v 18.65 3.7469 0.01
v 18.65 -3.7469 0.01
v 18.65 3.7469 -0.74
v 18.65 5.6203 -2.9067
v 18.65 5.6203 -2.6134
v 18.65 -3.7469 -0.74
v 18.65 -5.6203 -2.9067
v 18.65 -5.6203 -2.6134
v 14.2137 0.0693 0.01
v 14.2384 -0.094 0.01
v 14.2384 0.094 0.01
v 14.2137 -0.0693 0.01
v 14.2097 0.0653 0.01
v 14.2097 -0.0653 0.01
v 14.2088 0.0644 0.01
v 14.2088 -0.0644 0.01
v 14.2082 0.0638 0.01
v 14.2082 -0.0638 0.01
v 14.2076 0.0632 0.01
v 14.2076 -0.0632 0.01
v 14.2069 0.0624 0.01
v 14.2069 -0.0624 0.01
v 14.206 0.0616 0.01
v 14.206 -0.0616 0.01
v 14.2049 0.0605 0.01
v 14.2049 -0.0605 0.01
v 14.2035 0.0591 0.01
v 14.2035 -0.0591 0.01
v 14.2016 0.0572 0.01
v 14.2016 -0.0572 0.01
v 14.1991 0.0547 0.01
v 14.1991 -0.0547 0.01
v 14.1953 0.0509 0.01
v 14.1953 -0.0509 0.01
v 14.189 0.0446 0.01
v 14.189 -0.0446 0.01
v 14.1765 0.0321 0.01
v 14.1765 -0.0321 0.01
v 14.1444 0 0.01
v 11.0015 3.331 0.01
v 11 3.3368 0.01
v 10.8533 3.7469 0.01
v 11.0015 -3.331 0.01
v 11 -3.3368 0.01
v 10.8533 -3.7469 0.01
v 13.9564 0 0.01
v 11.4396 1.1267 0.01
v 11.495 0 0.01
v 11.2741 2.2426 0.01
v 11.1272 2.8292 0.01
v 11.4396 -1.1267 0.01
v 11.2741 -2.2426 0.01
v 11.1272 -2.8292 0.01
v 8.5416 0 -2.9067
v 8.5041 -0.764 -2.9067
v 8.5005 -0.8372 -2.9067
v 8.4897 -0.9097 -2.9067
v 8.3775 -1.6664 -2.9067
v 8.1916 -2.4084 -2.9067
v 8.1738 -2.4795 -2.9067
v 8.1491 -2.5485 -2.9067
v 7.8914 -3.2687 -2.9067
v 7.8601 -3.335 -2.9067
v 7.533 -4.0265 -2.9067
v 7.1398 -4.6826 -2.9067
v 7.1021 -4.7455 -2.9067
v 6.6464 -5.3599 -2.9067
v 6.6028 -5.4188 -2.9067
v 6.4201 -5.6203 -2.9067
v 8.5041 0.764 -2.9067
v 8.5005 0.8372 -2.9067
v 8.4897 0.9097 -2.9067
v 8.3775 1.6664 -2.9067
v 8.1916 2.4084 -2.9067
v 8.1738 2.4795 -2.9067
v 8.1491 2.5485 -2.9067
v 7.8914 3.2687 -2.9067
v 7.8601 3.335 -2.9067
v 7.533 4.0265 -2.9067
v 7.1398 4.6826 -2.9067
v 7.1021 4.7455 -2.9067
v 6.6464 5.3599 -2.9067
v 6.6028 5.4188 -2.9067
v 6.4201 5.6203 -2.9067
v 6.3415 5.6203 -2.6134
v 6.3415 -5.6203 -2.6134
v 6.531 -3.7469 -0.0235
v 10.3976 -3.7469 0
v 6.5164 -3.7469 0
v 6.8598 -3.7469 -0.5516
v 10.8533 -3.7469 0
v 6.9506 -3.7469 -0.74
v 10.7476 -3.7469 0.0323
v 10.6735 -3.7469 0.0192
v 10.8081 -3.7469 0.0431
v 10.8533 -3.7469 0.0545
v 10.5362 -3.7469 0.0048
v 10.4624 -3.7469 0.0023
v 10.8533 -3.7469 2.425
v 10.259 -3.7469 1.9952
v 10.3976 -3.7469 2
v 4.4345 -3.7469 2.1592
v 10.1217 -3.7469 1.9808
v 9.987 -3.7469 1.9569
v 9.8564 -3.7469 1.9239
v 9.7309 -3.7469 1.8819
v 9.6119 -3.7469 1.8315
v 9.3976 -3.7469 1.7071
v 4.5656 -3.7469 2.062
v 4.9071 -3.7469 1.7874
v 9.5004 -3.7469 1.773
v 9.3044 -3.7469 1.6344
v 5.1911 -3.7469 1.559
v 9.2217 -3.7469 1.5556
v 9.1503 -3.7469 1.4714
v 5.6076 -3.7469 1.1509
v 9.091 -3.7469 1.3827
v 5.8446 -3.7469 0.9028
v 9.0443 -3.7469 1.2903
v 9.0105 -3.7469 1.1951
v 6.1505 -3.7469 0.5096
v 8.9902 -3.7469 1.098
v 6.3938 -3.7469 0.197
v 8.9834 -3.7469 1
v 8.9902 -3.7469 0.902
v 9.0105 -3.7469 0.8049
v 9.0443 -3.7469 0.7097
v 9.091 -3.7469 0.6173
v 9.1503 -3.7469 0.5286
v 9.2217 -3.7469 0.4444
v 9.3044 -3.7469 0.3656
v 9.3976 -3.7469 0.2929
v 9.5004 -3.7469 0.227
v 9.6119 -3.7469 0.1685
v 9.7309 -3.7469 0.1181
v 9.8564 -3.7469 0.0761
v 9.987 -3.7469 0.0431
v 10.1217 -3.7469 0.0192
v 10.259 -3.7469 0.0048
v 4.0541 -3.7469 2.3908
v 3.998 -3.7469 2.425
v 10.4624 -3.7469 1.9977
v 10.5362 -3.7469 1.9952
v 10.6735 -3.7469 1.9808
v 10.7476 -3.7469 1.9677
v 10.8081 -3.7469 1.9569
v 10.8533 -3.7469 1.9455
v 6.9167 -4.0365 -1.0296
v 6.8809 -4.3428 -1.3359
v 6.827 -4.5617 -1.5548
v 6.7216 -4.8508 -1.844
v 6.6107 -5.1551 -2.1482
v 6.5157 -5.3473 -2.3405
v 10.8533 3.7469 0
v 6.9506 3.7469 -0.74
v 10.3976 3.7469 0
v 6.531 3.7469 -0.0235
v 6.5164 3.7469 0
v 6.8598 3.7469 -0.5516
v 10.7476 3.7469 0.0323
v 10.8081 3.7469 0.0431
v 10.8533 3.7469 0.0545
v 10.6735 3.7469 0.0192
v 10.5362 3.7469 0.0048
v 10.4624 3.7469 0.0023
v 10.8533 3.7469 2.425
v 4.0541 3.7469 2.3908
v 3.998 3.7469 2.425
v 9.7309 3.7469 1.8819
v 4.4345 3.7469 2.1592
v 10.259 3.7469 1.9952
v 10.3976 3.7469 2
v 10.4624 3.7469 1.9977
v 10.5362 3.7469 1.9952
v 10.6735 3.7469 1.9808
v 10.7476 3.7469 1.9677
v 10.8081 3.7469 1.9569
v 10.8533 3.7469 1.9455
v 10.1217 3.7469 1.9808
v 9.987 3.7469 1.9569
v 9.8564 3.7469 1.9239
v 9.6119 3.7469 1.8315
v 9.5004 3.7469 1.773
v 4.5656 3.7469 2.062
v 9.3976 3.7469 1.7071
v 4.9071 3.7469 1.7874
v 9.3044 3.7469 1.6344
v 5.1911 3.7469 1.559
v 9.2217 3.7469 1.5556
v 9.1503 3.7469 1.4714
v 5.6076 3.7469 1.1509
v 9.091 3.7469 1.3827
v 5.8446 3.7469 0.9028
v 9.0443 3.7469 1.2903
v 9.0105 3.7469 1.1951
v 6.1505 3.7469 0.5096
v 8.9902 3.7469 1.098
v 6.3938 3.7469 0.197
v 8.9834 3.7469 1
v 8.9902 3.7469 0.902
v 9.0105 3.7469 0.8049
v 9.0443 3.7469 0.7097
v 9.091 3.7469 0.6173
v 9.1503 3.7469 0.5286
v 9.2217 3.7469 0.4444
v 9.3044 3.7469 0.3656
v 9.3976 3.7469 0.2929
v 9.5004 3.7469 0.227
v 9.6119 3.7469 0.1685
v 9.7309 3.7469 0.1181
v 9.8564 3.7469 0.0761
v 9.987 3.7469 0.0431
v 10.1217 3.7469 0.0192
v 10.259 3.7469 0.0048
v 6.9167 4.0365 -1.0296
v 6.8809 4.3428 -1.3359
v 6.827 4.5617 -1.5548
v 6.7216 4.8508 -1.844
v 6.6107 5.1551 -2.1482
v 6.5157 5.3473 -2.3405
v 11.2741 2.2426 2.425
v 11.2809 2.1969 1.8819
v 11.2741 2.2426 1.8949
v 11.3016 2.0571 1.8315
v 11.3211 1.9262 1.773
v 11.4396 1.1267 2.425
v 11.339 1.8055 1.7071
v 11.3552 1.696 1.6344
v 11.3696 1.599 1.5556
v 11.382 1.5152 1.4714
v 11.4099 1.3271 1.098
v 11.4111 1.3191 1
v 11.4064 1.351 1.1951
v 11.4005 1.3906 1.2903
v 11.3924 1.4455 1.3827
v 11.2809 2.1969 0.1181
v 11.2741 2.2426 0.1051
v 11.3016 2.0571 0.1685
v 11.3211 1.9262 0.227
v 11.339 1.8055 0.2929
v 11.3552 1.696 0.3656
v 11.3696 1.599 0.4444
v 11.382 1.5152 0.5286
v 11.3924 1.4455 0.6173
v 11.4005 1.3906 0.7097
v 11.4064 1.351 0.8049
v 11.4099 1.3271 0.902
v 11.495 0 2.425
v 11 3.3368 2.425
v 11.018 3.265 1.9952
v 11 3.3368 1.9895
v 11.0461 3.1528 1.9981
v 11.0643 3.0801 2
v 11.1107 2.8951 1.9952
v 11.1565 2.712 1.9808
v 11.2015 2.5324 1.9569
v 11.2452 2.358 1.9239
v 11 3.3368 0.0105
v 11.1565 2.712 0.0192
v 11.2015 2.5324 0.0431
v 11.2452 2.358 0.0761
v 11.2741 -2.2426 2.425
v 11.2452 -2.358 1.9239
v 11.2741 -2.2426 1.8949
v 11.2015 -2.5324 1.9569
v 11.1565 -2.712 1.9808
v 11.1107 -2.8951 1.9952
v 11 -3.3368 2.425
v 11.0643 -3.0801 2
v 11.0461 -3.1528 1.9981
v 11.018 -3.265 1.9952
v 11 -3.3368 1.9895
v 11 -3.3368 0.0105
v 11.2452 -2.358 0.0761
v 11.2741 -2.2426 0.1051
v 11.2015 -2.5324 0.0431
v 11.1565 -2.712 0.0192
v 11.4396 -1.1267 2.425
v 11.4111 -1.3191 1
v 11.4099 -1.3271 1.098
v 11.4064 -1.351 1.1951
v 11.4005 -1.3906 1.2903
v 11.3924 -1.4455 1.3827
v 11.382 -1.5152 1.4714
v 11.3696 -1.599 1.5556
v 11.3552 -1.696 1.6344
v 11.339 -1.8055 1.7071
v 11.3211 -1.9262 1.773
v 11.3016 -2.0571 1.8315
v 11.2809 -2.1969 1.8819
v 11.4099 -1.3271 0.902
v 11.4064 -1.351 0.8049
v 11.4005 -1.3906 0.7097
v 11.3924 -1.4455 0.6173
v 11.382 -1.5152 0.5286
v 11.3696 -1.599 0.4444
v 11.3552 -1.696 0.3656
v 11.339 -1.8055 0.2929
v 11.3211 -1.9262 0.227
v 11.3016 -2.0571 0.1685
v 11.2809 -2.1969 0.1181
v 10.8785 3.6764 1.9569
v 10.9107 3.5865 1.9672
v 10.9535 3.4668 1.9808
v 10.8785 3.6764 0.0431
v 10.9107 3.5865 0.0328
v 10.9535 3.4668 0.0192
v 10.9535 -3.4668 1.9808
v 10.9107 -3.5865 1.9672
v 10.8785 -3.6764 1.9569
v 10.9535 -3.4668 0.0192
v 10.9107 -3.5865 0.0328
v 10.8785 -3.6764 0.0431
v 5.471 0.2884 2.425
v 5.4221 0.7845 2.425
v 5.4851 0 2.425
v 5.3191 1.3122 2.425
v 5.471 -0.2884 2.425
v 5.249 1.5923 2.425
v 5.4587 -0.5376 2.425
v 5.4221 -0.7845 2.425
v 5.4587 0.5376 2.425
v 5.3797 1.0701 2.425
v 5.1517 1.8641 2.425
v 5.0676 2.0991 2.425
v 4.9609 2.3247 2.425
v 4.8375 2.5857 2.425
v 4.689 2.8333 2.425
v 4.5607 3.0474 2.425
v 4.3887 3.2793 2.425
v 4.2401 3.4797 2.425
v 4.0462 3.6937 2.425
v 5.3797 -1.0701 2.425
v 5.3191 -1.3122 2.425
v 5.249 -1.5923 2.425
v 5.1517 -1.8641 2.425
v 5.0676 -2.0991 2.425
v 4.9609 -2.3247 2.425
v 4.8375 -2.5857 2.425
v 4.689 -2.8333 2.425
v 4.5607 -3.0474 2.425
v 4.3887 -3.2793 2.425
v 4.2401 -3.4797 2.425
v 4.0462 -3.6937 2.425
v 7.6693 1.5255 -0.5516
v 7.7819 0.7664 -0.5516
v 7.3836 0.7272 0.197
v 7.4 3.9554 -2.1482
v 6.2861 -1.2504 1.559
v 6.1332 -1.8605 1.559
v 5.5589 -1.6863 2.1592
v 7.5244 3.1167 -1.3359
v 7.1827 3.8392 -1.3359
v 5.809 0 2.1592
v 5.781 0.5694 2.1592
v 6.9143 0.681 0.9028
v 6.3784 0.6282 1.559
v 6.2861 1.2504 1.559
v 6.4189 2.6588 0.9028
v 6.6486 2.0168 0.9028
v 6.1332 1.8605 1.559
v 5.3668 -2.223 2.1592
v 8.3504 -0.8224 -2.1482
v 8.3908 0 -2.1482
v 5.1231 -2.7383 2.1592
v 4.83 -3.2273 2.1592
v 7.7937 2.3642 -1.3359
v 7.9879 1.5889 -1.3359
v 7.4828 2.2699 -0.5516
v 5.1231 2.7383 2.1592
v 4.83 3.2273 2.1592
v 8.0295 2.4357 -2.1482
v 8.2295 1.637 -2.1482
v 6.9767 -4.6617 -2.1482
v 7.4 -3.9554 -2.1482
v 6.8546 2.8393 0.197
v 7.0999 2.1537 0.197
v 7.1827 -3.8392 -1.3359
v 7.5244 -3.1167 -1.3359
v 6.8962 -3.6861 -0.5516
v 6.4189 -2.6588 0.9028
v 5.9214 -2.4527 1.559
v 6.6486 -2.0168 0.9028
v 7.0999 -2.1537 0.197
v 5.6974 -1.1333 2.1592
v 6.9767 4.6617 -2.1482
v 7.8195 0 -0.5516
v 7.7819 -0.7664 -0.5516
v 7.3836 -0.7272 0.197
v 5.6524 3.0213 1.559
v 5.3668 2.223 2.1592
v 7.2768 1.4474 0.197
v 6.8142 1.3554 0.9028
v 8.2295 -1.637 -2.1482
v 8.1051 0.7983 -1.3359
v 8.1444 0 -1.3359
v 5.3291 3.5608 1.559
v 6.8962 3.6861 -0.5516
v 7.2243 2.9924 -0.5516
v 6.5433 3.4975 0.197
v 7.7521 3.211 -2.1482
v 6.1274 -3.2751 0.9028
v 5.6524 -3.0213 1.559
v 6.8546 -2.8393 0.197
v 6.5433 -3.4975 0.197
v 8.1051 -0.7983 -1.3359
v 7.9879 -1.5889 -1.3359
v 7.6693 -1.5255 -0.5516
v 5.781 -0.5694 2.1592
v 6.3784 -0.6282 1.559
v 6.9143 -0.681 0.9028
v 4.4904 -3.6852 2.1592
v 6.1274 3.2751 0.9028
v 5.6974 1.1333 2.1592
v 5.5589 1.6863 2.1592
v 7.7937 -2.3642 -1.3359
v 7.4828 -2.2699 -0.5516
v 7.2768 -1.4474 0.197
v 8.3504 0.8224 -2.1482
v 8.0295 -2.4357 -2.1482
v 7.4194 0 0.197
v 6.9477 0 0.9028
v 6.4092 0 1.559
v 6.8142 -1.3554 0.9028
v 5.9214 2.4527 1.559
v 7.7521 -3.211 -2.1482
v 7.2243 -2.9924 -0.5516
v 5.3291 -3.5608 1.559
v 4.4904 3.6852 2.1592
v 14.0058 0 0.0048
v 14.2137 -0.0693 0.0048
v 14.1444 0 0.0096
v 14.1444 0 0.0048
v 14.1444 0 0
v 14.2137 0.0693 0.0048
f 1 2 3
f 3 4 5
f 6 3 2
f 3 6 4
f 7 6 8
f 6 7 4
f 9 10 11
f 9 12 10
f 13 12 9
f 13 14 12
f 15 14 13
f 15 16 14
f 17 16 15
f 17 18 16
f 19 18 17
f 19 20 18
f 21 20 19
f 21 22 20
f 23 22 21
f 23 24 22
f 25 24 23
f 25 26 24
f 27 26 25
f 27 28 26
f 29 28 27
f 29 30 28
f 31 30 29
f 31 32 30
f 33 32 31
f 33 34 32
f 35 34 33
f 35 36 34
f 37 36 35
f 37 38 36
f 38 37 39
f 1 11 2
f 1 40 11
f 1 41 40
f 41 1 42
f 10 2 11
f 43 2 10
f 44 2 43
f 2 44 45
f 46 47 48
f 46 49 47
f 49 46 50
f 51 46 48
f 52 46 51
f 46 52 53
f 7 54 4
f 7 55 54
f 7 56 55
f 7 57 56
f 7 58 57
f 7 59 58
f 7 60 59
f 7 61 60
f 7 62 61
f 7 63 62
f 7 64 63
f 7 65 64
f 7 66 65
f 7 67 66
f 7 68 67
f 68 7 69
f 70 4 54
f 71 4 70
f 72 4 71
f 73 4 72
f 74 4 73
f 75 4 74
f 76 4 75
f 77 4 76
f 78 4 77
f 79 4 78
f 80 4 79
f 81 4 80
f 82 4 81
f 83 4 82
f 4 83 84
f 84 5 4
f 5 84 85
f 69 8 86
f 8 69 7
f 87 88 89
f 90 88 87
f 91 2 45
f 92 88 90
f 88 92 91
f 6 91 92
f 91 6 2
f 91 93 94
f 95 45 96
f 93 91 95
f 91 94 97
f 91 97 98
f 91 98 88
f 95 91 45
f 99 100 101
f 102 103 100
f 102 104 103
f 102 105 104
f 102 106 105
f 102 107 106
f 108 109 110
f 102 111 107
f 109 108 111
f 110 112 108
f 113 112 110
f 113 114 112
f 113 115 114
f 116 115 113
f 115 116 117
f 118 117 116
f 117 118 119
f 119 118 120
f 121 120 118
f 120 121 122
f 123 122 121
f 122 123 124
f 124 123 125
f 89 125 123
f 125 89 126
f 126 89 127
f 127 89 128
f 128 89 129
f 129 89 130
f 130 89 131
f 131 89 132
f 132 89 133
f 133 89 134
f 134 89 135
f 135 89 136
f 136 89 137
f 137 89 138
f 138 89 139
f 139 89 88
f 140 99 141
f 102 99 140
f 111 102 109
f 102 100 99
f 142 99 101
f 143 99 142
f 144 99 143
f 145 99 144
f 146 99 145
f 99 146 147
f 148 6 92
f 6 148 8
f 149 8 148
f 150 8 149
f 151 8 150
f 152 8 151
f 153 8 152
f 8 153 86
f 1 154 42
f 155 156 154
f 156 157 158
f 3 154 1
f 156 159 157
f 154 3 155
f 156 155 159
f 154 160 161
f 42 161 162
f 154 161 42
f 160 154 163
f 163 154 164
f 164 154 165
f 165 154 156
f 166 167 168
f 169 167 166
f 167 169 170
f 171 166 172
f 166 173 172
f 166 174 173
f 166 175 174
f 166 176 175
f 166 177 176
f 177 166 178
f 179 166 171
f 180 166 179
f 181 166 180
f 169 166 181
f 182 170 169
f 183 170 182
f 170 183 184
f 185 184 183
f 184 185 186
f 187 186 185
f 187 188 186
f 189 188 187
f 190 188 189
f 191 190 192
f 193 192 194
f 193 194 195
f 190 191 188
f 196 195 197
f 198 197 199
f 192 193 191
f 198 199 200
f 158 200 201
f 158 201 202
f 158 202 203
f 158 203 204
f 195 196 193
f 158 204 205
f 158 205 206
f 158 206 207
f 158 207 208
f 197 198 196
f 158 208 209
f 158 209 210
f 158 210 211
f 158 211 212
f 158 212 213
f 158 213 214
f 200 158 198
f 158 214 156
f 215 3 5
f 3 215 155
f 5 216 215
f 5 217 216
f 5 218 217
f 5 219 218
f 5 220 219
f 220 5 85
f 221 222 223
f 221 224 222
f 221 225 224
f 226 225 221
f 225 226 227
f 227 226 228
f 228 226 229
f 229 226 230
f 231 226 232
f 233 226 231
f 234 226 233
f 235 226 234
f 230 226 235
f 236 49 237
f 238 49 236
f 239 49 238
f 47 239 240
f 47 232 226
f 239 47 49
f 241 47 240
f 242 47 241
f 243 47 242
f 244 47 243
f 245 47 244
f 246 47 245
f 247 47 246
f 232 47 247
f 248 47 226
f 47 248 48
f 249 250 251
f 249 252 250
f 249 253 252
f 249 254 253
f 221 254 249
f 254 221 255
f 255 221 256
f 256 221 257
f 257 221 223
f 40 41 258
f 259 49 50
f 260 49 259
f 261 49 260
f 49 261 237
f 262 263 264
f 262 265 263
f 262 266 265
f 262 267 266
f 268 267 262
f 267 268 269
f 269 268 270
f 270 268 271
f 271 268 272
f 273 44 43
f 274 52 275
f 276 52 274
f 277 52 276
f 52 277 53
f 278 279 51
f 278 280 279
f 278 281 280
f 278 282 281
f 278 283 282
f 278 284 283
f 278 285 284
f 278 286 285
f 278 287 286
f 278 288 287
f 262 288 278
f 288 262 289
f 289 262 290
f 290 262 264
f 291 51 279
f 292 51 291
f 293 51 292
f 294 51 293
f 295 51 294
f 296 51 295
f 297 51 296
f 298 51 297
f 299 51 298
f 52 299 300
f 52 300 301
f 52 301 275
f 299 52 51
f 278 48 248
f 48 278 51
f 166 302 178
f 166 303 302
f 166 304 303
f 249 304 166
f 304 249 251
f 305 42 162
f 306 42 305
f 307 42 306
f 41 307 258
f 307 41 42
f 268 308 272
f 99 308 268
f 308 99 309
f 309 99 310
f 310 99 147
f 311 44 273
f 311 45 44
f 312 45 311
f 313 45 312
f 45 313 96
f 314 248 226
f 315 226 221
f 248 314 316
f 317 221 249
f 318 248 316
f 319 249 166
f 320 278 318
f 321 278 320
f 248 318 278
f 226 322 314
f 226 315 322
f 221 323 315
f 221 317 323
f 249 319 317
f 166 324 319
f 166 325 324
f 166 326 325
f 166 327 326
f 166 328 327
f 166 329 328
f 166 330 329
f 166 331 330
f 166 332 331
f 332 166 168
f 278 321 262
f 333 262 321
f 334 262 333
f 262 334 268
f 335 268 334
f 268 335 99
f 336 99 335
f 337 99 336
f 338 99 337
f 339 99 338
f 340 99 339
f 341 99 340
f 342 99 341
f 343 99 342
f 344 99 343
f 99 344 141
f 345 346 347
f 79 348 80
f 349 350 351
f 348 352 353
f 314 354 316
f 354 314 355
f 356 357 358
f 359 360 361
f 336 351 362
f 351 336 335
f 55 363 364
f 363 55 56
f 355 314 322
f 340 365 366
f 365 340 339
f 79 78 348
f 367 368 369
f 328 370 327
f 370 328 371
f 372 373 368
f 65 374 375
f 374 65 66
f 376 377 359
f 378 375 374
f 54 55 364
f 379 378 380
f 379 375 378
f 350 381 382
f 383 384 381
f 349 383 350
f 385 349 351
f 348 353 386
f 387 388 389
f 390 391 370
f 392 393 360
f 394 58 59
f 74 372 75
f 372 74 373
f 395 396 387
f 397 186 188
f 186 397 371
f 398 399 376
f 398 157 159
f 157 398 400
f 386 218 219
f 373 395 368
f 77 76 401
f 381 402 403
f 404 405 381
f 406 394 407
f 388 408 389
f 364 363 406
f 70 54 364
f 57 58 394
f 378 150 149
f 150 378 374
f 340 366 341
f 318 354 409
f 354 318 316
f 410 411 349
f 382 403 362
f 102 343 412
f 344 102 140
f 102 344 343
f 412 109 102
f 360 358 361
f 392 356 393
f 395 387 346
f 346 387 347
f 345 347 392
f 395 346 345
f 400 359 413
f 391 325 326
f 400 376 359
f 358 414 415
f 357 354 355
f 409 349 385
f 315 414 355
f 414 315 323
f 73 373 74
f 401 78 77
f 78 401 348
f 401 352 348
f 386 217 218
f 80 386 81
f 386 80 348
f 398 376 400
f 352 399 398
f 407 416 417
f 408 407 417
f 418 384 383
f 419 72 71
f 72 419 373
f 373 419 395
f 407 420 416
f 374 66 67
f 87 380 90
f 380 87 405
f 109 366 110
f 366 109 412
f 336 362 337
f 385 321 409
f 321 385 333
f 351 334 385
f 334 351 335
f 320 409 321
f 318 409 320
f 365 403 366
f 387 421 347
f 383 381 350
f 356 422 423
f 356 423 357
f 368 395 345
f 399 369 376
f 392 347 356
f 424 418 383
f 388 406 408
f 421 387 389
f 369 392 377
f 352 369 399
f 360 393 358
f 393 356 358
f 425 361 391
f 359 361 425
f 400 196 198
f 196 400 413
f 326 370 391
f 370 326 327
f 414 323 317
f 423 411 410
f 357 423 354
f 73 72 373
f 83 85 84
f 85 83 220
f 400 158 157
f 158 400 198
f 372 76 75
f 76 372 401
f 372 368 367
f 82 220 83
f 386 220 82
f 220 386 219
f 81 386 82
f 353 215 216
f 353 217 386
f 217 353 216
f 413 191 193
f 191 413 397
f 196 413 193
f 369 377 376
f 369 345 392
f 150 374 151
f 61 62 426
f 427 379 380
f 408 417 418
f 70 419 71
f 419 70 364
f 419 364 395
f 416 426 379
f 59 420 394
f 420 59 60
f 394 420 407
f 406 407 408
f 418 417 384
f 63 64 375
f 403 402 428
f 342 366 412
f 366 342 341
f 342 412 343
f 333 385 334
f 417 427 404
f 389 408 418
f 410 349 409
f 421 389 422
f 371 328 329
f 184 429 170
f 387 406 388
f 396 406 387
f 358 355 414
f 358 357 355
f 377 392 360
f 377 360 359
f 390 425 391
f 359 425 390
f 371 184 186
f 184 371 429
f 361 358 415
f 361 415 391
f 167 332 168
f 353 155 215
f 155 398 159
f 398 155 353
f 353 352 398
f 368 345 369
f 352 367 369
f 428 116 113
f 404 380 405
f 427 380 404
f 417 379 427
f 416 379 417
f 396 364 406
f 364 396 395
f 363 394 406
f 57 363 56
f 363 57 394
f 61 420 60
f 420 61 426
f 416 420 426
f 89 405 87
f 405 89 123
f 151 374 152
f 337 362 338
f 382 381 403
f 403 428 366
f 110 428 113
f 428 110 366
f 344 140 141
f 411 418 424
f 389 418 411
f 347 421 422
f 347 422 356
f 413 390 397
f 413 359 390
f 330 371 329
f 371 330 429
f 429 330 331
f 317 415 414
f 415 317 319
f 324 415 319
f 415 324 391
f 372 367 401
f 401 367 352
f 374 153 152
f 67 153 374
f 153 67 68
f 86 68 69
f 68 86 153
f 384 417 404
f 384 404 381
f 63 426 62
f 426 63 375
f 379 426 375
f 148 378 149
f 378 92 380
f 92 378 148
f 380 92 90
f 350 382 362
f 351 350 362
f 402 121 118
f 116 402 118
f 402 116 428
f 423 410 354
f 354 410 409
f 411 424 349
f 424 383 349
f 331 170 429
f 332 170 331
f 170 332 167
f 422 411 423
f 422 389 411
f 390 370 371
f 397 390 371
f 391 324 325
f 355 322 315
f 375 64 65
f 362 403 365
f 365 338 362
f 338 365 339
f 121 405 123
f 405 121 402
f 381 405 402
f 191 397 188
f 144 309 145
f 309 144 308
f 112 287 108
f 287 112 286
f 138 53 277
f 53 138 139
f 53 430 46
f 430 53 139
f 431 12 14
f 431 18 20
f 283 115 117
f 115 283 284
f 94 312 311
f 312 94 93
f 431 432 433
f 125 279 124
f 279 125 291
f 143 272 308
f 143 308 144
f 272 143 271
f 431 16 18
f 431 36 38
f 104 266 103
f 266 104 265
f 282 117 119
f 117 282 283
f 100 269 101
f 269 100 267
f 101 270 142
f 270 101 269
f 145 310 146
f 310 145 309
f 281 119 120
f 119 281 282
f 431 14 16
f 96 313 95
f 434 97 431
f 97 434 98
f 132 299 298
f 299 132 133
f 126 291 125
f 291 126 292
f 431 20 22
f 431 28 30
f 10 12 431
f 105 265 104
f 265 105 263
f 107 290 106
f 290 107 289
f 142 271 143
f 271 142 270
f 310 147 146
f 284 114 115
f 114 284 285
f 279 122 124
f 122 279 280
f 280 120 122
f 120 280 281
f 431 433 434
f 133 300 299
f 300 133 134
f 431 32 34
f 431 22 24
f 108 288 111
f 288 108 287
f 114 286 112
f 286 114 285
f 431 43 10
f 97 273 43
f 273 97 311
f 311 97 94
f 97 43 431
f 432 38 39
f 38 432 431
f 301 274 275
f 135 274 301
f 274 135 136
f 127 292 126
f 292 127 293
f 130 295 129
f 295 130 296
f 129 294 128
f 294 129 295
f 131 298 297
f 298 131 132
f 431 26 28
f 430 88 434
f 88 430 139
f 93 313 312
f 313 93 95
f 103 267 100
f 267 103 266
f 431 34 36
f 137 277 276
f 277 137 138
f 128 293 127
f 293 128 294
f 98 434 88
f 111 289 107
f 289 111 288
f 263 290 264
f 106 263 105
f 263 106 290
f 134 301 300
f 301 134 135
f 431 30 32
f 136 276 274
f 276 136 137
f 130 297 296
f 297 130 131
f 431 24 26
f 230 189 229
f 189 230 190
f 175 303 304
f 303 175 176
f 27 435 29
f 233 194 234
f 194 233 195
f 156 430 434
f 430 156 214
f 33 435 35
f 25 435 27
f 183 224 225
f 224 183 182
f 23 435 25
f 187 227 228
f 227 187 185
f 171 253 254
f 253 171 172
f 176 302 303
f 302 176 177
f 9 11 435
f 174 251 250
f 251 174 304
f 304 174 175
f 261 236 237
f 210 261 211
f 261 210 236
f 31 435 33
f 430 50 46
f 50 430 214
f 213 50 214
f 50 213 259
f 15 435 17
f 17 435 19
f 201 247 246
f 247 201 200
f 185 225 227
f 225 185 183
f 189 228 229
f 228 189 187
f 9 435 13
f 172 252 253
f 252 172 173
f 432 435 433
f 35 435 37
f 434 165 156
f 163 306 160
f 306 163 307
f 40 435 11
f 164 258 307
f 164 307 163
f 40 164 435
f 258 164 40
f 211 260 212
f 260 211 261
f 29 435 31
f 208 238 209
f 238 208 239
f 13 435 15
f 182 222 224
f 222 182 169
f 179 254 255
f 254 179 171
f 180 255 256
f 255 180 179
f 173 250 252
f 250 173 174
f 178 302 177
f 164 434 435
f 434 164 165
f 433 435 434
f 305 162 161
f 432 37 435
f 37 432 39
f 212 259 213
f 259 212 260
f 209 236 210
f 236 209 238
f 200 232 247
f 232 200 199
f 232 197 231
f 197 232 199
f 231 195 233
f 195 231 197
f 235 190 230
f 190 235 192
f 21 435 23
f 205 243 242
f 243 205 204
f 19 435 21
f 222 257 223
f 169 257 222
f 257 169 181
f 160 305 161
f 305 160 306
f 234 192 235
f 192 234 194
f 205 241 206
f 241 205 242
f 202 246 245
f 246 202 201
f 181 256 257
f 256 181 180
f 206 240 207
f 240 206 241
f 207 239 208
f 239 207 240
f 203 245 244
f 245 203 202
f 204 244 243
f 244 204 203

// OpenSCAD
$fn=64;


difference() {
	difference() {
		difference() {
			union() {
				rotate(a = [0, 180, 0]) {
					translate(v = [0, 0, 0.2500000000]) {
						translate(v = [0, 0, 2.6566666667]) {
							rotate(a = [0, 180, 0]) {
								difference() {
									difference() {
										difference() {
											difference() {
												translate(v = [0, -5.6202794913, 0]) {
													cube(size = [18.6500000000, 11.2405589825, 2.9166666667]);
												}
												translate(v = [0, -14.9874119767, 0]) {
													translate(v = [0, 0, 2.1666666667]) {
														translate(v = [-0.5000000000, 0, 0]) {
															cube(size = [19.6500000000, 11.2405589825, 2.6666666667]);
														}
													}
												}
											}
											translate(v = [0, -3.7468529942, 0]) {
												translate(v = [0, 0, 2.1666666667]) {
													rotate(a = 45, v = [1, 0, 0]) {
														translate(v = [0, -11.2405589825, 0]) {
															translate(v = [-0.5000000000, 0, 0]) {
																cube(size = [19.6500000000, 11.2405589825, 2.6666666667]);
															}
														}
													}
												}
											}
										}
										mirror(v = [0, 1, 0]) {
											translate(v = [0, -14.9874119767, 0]) {
												translate(v = [0, 0, 2.1666666667]) {
													translate(v = [-0.5000000000, 0, 0]) {
														cube(size = [19.6500000000, 11.2405589825, 2.6666666667]);
													}
												}
											}
										}
									}
									mirror(v = [0, 1, 0]) {
										translate(v = [0, -3.7468529942, 0]) {
											translate(v = [0, 0, 2.1666666667]) {
												rotate(a = 45, v = [1, 0, 0]) {
													translate(v = [0, -11.2405589825, 0]) {
														translate(v = [-0.5000000000, 0, 0]) {
															cube(size = [19.6500000000, 11.2405589825, 2.6666666667]);
														}
													}
												}
											}
										}
									}
								}
							}
						}
					}
				}
				intersection() {
					cylinder(h = 2.4250000000, r = 11.4950000000);
					translate(v = [0, -3.7468529942, 0]) {
						cube(size = [18.6500000000, 7.4937059884, 5.0916666667]);
					}
				}
			}
			translate(v = [0, 0, -4.2500000000]) {
				sphere(r = 8.6500000000);
			}
		}
		translate(v = [14.1444251603, 0, 0]) {
			translate(v = [0, 0, 1.0000000000]) {
				rotate(a = [90, 0, -45]) {
					cylinder(h = 11.2405589825, r = 1.0000000000);
				}
			}
		}
	}
	mirror(v = [0, 1, 0]) {
		translate(v = [14.1444251603, 0, 0]) {
			translate(v = [0, 0, 1.0000000000]) {
				rotate(a = [90, 0, -45]) {
					cylinder(h = 11.2405589825, r = 1.0000000000);
				}
			}
		}
	}
}
